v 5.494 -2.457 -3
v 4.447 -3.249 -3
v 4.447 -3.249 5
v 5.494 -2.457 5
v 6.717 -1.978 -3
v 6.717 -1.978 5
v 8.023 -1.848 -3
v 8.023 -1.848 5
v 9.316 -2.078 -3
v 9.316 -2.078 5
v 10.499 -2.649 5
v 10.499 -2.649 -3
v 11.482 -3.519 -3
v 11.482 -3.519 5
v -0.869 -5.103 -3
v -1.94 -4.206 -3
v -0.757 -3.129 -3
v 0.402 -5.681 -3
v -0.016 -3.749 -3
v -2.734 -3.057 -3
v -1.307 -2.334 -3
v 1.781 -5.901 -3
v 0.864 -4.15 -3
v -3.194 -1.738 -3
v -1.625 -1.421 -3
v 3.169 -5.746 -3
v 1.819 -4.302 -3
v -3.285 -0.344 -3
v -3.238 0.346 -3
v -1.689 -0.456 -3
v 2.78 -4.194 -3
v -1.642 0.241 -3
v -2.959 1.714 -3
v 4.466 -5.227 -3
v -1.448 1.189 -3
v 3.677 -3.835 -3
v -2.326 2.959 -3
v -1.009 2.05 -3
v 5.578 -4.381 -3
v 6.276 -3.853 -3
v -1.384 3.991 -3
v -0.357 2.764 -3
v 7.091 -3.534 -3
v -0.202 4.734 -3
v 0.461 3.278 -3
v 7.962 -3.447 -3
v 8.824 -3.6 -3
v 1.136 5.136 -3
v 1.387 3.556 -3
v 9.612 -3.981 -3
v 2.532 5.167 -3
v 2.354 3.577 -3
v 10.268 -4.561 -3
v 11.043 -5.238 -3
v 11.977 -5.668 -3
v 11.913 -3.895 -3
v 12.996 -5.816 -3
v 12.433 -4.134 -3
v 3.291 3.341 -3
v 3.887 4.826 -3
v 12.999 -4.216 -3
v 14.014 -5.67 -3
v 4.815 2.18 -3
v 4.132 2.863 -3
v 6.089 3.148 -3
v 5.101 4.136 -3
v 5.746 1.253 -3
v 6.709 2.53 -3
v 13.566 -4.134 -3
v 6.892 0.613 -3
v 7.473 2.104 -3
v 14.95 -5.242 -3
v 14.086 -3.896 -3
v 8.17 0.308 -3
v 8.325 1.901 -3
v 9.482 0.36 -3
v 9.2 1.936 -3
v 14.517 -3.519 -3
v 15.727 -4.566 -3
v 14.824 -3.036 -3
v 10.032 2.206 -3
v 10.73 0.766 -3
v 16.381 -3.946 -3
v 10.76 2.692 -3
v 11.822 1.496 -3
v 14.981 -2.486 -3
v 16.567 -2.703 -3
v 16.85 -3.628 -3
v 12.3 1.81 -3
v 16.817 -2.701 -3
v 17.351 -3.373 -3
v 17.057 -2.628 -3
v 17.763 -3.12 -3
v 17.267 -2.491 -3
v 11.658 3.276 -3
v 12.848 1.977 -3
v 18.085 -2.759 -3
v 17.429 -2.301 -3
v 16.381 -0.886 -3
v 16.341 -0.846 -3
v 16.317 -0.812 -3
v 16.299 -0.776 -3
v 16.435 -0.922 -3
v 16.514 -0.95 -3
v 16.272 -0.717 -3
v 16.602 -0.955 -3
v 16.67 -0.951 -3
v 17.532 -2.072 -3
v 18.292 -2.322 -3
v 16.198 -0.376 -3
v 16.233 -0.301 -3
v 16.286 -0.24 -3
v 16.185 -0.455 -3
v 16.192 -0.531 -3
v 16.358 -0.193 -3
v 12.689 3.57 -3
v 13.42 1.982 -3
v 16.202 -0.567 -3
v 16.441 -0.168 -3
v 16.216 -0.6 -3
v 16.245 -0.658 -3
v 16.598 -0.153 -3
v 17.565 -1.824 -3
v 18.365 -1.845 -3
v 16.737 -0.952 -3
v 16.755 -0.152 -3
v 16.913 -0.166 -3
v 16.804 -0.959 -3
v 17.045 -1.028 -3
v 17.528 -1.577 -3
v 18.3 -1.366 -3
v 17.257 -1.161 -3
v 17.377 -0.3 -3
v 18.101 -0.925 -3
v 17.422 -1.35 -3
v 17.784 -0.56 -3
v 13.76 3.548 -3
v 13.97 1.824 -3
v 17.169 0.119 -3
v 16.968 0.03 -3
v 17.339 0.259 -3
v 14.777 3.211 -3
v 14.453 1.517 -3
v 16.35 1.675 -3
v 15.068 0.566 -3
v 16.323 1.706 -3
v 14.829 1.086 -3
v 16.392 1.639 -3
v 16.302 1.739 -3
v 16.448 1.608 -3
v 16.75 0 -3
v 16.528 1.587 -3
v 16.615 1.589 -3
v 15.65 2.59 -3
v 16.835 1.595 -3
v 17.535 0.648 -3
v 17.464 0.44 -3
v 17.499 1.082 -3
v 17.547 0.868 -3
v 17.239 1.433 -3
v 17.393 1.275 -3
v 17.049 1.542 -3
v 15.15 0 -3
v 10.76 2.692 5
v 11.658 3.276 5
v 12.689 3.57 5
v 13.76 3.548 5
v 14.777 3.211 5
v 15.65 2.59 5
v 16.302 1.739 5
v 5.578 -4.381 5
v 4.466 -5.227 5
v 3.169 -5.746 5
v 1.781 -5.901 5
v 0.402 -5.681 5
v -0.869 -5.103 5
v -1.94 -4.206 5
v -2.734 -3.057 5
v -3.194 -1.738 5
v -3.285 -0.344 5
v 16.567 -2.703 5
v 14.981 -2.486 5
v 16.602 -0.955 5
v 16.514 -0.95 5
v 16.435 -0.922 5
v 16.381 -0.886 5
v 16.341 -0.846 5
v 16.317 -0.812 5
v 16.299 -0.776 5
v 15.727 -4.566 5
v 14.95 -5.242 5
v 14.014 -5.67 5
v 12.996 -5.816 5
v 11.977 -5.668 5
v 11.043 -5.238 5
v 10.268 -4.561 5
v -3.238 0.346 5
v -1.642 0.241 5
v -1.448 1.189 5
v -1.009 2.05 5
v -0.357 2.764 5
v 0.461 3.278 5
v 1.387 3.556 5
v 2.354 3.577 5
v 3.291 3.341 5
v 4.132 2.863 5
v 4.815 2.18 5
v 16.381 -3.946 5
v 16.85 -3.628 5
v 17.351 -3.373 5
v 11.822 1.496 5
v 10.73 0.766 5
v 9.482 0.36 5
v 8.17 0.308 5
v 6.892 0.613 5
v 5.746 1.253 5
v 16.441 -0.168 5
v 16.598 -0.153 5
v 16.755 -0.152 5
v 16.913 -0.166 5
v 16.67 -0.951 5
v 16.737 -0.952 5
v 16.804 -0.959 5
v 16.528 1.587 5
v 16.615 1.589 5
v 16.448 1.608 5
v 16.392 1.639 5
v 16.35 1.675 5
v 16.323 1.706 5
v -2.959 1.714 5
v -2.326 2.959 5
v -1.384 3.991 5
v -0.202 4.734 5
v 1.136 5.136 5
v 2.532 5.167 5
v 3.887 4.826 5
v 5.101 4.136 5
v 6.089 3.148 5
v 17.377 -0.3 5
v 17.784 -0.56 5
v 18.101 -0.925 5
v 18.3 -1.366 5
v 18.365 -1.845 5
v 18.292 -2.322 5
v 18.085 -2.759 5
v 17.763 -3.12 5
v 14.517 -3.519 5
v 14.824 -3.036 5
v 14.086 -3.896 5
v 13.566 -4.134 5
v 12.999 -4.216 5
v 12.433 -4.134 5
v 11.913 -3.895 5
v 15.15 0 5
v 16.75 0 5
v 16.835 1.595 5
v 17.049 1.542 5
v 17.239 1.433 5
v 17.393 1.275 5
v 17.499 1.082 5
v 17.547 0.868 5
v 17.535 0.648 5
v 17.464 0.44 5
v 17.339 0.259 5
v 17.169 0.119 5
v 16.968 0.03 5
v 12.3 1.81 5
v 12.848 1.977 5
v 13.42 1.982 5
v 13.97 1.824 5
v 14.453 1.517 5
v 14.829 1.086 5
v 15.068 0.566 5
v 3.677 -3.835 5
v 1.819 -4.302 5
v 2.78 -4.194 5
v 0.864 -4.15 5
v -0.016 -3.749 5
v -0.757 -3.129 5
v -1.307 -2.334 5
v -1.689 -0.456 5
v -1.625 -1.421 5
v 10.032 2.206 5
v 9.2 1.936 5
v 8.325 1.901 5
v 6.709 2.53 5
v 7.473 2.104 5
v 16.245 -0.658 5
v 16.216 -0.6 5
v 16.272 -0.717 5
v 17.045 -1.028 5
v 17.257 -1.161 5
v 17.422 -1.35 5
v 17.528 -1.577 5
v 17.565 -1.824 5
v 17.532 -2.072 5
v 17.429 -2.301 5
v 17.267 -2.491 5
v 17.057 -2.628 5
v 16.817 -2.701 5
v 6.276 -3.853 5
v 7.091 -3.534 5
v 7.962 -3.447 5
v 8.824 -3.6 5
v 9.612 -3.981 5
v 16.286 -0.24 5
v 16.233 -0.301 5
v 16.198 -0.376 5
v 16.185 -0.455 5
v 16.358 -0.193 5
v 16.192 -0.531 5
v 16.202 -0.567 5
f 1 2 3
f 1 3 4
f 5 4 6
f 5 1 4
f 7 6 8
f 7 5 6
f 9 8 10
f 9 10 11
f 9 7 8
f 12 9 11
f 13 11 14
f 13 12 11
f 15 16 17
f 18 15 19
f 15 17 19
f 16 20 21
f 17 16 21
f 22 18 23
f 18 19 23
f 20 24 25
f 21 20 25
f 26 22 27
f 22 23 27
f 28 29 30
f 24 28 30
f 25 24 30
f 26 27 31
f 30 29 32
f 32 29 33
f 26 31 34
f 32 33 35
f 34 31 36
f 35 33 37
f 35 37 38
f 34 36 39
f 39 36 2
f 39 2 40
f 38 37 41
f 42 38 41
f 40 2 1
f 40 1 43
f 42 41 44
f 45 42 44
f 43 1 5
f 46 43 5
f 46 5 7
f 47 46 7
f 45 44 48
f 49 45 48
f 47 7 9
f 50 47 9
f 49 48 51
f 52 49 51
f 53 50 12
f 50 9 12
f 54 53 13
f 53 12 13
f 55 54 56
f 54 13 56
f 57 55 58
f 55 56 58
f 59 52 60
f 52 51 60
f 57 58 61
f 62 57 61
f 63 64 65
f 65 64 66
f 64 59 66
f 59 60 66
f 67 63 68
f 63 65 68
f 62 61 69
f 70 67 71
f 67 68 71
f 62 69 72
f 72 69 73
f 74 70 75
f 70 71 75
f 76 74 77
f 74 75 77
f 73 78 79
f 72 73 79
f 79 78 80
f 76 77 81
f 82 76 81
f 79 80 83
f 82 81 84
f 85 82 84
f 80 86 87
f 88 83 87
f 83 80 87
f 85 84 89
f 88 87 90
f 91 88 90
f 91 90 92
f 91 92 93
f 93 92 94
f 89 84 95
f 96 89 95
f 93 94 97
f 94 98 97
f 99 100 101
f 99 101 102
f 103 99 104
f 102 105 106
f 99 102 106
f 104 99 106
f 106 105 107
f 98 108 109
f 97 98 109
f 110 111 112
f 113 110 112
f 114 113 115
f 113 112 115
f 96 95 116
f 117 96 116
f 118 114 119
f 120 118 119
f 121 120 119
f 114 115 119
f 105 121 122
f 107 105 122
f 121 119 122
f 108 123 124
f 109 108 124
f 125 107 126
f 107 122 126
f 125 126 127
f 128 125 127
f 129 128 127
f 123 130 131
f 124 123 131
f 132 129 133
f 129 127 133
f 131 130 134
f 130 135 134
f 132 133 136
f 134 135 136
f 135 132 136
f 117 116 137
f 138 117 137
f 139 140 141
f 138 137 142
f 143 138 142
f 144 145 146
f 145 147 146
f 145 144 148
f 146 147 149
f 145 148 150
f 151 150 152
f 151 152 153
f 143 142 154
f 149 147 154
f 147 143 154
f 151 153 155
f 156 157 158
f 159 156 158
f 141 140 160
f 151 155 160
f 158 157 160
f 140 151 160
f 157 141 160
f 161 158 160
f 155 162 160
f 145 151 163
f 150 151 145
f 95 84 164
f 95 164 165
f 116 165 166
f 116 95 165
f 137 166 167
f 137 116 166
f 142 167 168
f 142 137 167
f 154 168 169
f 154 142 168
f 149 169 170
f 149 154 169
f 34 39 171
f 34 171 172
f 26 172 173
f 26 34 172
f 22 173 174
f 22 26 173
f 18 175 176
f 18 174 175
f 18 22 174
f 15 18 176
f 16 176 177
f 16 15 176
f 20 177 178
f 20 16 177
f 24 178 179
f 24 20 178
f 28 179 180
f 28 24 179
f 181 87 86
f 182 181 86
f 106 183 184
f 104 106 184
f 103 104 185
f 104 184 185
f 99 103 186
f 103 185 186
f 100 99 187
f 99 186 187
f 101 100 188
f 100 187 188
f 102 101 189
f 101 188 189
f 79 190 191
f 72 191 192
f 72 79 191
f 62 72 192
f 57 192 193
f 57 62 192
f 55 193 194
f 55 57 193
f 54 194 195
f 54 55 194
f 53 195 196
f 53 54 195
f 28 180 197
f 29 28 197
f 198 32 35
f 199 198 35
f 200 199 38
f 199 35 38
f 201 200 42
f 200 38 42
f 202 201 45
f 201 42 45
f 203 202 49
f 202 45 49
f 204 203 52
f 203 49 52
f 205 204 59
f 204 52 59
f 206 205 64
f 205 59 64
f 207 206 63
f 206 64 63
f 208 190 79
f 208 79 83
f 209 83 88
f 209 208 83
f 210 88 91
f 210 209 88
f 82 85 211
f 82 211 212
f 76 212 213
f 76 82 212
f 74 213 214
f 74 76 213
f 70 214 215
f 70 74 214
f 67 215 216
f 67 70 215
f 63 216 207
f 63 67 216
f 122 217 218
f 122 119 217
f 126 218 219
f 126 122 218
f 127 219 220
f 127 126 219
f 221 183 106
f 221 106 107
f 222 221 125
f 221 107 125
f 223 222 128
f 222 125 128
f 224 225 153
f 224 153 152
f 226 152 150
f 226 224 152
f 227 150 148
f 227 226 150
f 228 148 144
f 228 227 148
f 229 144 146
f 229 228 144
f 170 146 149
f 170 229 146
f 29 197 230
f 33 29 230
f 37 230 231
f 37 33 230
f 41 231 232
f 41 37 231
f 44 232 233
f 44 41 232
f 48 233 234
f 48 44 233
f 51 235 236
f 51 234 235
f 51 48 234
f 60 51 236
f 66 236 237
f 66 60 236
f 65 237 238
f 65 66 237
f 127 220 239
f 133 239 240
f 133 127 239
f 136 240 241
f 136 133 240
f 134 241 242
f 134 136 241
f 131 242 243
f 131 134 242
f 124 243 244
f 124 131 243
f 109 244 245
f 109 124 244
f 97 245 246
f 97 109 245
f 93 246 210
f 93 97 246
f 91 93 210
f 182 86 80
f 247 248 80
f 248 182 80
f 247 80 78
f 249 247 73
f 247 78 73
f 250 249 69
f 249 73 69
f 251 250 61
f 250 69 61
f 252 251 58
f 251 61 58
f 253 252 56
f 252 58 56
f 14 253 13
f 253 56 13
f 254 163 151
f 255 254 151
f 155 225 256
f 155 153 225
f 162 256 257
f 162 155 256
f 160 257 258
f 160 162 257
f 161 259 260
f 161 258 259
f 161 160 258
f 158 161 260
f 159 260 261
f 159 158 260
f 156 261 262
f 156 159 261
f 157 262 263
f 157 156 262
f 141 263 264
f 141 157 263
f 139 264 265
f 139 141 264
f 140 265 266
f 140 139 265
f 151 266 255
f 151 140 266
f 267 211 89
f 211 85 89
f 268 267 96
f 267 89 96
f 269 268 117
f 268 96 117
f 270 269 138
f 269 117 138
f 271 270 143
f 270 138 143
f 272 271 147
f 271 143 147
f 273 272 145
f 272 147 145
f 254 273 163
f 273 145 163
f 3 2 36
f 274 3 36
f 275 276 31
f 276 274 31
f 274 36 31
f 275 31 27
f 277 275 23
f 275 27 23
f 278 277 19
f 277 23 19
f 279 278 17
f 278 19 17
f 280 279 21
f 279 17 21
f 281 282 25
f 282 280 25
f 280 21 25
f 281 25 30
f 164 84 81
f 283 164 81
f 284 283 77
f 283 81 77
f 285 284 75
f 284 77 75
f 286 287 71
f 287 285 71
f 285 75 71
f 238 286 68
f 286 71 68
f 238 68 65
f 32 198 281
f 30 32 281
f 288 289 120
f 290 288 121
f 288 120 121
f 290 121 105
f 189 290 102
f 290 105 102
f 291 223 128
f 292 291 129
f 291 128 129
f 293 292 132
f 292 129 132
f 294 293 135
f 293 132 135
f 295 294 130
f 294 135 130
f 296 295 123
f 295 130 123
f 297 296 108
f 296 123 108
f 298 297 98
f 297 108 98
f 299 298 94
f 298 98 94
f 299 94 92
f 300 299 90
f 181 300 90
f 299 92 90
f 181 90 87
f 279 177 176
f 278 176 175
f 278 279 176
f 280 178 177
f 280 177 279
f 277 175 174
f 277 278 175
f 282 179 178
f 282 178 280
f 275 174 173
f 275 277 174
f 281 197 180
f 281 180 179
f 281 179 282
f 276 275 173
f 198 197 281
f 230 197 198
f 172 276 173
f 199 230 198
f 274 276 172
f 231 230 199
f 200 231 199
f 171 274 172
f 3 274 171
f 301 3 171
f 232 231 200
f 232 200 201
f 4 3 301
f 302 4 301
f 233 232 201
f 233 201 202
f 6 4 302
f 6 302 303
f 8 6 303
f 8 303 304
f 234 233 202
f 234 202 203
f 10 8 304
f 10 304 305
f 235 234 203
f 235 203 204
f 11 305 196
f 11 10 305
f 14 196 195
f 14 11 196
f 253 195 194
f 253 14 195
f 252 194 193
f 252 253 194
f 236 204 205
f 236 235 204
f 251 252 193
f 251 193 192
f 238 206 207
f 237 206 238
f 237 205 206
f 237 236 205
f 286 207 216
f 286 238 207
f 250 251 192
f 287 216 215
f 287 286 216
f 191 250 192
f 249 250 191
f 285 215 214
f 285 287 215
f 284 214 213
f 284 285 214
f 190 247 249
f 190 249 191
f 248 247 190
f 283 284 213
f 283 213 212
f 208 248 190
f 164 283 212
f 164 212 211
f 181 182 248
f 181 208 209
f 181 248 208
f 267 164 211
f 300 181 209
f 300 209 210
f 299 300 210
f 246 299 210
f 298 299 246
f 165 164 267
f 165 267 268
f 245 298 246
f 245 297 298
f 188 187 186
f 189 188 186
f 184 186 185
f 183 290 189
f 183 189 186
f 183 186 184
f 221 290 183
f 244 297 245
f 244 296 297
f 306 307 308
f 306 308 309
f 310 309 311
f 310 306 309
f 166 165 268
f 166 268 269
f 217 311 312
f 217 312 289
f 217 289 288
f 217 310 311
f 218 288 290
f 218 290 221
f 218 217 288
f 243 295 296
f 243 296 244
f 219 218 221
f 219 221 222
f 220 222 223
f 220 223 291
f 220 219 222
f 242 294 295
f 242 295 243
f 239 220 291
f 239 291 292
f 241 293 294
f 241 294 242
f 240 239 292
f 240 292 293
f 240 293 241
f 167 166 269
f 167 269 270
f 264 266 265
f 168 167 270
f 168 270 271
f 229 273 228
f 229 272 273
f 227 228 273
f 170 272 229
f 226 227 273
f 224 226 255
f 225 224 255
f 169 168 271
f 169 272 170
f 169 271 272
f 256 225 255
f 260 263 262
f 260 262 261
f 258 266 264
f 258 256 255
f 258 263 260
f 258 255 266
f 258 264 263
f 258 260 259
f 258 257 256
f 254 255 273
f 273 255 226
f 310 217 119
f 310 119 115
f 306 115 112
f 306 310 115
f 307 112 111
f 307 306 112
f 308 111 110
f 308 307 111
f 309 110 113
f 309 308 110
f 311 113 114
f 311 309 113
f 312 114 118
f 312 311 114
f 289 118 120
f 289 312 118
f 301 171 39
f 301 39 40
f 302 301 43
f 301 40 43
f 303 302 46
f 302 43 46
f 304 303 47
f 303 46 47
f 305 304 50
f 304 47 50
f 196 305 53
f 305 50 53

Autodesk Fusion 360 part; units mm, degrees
sketch "Sketch1" plane through (0, 0, 0) normal (0, 0, 1) x (1, 0, 0)
  line L0 (1.75, 0) -> (22.5, 0)
  arc A0 (2.5867, 1.9676) -> (5.5063, 1.6827) centre (4.1786, 3.1784) ccw
  arc A1 (2.5867, 1.9676) -> (-3.25, 0) centre (0, 0) ccw
  arc A2 (9.25, 0) -> (5.5063, 1.6827) centre (7, 0) ccw
  line L1 (0, 0) -> (-9.754, 0) construction
  line L2 (-0.0298, -0.4392) -> (6.906, -1.3851) construction
  line L3 (-0.0298, -0.4392) -> (-3.25, 0) construction
  arc A3 (-3.25, 0) -> (2.2673, -2.7382) centre (-0.0298, -0.4392) ccw
  arc A4 (5.1986, -2.8504) -> (2.2673, -2.7382) centre (3.681, -4.153) ccw
  arc A5 (5.1986, -2.8504) -> (9.1354, -1.6891) centre (6.906, -1.3851) ccw
  line L4 (6.906, -1.3851) -> (14.4668, -2.4162) construction
  line L5 (9.25, 0) -> (9.25, 1.1887) construction
  line L6 (9.1354, -1.6891) -> (9.284, -0.5992) construction
  line L7 (9.284, -0.5992) -> (9.3516, -0.1038)
  arc A6 (9.0126, -2.1755) -> (9.3516, -0.1038) centre (9.2097, -1.1441) ccw
  arc A7 (9.1354, -1.6891) -> (9.284, -0.5992) centre (9.2097, -1.1441) ccw
  arc A8 (9.25, 0) -> (9.0382, 0.9529) centre (9.25, 0.5) ccw
  line L8 (9.1354, -1.6891) -> (8.1445, -1.554)
  circle A9 centre (6.906, -1.3851) radius 2.25
  circle A10 centre (9.2097, -1.1441) radius 0.55
  circle A11 centre (9.2097, -1.1441) radius 1.05
  arc A12 (8.2852, -0.6486) -> (8.3822, -1.0313) centre (9.284, -0.5992) ccw
  arc A13 (8.3822, -1.0313) -> (8.1445, -1.554) centre (9.1354, -1.6891) ccw
  arc A14 (5.9575, -2.1992) -> (8.1445, -1.554) centre (6.906, -1.3851) ccw
  arc A15 (5.9575, -2.1992) -> (1.5605, -2.0308) centre (3.681, -4.153) ccw
  arc A16 (-2.249, -0.0679) -> (1.5605, -2.0308) centre (-0.0298, -0.4392) ccw
  arc A17 (1.7908, 1.3622) -> (-2.249, -0.0679) centre (0, 0) ccw
  arc A18 (1.7908, 1.3622) -> (6.1702, 0.9348) centre (4.1786, 3.1784) ccw
  arc A19 (8.1411, -0.5102) -> (6.1702, 0.9348) centre (7, 0) ccw
  arc A20 (8.1411, -0.5102) -> (8.2852, -0.6486) centre (9.25, 0.5) ccw
  arc A21 (8.8249, -3.1577) -> (10.7264, 0.235) centre (9.2097, -1.1441) ccw
  arc A22 (10.7264, 0.235) -> (8.6147, 1.8588) centre (9.25, 0.5) ccw
  dimension "d1" = 6.5
  dimension "d2" = 4.5
  dimension "d3" = 4
  dimension "d4" = 7
  dimension "d9" = 7
  dimension "d10" = 1
  dimension "d11" = 1.1
  dimension "d12" = 0.5
  dimension "d13" = -1
extrude "Extrude1" add sketch "Sketch1" along normal blind 5 contours L0 A9 A19 | L0 A0 A1 A2 A3 A4 A9 A15 A16 A17 A18 A19 | A5 L8 A9 A11 A14 A15 | A2 A8 | L7 A9 A10 A11 | A5 L8 A9 A11 | A5 L7 A6 A7 A9 A10 A11 picked at (8.4833, 0.0606)
scale "Scale1" factor 1.6 about (-3.25, 0, 5) bodies 1
fillet "Fillet1" radius 278 1 edges at (-3.25, 0, 1)
fillet "Fillet1" radius 506.5 1 edges at (-1.6484, -0.1087, 1)
fillet "Fillet1" radius 4.5 1 edges at (16.3701, -3.4808, 1)
fillet "Fillet1" radius 0.3 1 edges at (16.4112, 1.5247, 1)
fillet "Fillet1" radius 0.3 2 edges at (16.0356, -0.2814, 1) (16.3887, -1.0022, 1)
equation "d9 = d4"
equation "d11 = d10 + 0.1 mm"
